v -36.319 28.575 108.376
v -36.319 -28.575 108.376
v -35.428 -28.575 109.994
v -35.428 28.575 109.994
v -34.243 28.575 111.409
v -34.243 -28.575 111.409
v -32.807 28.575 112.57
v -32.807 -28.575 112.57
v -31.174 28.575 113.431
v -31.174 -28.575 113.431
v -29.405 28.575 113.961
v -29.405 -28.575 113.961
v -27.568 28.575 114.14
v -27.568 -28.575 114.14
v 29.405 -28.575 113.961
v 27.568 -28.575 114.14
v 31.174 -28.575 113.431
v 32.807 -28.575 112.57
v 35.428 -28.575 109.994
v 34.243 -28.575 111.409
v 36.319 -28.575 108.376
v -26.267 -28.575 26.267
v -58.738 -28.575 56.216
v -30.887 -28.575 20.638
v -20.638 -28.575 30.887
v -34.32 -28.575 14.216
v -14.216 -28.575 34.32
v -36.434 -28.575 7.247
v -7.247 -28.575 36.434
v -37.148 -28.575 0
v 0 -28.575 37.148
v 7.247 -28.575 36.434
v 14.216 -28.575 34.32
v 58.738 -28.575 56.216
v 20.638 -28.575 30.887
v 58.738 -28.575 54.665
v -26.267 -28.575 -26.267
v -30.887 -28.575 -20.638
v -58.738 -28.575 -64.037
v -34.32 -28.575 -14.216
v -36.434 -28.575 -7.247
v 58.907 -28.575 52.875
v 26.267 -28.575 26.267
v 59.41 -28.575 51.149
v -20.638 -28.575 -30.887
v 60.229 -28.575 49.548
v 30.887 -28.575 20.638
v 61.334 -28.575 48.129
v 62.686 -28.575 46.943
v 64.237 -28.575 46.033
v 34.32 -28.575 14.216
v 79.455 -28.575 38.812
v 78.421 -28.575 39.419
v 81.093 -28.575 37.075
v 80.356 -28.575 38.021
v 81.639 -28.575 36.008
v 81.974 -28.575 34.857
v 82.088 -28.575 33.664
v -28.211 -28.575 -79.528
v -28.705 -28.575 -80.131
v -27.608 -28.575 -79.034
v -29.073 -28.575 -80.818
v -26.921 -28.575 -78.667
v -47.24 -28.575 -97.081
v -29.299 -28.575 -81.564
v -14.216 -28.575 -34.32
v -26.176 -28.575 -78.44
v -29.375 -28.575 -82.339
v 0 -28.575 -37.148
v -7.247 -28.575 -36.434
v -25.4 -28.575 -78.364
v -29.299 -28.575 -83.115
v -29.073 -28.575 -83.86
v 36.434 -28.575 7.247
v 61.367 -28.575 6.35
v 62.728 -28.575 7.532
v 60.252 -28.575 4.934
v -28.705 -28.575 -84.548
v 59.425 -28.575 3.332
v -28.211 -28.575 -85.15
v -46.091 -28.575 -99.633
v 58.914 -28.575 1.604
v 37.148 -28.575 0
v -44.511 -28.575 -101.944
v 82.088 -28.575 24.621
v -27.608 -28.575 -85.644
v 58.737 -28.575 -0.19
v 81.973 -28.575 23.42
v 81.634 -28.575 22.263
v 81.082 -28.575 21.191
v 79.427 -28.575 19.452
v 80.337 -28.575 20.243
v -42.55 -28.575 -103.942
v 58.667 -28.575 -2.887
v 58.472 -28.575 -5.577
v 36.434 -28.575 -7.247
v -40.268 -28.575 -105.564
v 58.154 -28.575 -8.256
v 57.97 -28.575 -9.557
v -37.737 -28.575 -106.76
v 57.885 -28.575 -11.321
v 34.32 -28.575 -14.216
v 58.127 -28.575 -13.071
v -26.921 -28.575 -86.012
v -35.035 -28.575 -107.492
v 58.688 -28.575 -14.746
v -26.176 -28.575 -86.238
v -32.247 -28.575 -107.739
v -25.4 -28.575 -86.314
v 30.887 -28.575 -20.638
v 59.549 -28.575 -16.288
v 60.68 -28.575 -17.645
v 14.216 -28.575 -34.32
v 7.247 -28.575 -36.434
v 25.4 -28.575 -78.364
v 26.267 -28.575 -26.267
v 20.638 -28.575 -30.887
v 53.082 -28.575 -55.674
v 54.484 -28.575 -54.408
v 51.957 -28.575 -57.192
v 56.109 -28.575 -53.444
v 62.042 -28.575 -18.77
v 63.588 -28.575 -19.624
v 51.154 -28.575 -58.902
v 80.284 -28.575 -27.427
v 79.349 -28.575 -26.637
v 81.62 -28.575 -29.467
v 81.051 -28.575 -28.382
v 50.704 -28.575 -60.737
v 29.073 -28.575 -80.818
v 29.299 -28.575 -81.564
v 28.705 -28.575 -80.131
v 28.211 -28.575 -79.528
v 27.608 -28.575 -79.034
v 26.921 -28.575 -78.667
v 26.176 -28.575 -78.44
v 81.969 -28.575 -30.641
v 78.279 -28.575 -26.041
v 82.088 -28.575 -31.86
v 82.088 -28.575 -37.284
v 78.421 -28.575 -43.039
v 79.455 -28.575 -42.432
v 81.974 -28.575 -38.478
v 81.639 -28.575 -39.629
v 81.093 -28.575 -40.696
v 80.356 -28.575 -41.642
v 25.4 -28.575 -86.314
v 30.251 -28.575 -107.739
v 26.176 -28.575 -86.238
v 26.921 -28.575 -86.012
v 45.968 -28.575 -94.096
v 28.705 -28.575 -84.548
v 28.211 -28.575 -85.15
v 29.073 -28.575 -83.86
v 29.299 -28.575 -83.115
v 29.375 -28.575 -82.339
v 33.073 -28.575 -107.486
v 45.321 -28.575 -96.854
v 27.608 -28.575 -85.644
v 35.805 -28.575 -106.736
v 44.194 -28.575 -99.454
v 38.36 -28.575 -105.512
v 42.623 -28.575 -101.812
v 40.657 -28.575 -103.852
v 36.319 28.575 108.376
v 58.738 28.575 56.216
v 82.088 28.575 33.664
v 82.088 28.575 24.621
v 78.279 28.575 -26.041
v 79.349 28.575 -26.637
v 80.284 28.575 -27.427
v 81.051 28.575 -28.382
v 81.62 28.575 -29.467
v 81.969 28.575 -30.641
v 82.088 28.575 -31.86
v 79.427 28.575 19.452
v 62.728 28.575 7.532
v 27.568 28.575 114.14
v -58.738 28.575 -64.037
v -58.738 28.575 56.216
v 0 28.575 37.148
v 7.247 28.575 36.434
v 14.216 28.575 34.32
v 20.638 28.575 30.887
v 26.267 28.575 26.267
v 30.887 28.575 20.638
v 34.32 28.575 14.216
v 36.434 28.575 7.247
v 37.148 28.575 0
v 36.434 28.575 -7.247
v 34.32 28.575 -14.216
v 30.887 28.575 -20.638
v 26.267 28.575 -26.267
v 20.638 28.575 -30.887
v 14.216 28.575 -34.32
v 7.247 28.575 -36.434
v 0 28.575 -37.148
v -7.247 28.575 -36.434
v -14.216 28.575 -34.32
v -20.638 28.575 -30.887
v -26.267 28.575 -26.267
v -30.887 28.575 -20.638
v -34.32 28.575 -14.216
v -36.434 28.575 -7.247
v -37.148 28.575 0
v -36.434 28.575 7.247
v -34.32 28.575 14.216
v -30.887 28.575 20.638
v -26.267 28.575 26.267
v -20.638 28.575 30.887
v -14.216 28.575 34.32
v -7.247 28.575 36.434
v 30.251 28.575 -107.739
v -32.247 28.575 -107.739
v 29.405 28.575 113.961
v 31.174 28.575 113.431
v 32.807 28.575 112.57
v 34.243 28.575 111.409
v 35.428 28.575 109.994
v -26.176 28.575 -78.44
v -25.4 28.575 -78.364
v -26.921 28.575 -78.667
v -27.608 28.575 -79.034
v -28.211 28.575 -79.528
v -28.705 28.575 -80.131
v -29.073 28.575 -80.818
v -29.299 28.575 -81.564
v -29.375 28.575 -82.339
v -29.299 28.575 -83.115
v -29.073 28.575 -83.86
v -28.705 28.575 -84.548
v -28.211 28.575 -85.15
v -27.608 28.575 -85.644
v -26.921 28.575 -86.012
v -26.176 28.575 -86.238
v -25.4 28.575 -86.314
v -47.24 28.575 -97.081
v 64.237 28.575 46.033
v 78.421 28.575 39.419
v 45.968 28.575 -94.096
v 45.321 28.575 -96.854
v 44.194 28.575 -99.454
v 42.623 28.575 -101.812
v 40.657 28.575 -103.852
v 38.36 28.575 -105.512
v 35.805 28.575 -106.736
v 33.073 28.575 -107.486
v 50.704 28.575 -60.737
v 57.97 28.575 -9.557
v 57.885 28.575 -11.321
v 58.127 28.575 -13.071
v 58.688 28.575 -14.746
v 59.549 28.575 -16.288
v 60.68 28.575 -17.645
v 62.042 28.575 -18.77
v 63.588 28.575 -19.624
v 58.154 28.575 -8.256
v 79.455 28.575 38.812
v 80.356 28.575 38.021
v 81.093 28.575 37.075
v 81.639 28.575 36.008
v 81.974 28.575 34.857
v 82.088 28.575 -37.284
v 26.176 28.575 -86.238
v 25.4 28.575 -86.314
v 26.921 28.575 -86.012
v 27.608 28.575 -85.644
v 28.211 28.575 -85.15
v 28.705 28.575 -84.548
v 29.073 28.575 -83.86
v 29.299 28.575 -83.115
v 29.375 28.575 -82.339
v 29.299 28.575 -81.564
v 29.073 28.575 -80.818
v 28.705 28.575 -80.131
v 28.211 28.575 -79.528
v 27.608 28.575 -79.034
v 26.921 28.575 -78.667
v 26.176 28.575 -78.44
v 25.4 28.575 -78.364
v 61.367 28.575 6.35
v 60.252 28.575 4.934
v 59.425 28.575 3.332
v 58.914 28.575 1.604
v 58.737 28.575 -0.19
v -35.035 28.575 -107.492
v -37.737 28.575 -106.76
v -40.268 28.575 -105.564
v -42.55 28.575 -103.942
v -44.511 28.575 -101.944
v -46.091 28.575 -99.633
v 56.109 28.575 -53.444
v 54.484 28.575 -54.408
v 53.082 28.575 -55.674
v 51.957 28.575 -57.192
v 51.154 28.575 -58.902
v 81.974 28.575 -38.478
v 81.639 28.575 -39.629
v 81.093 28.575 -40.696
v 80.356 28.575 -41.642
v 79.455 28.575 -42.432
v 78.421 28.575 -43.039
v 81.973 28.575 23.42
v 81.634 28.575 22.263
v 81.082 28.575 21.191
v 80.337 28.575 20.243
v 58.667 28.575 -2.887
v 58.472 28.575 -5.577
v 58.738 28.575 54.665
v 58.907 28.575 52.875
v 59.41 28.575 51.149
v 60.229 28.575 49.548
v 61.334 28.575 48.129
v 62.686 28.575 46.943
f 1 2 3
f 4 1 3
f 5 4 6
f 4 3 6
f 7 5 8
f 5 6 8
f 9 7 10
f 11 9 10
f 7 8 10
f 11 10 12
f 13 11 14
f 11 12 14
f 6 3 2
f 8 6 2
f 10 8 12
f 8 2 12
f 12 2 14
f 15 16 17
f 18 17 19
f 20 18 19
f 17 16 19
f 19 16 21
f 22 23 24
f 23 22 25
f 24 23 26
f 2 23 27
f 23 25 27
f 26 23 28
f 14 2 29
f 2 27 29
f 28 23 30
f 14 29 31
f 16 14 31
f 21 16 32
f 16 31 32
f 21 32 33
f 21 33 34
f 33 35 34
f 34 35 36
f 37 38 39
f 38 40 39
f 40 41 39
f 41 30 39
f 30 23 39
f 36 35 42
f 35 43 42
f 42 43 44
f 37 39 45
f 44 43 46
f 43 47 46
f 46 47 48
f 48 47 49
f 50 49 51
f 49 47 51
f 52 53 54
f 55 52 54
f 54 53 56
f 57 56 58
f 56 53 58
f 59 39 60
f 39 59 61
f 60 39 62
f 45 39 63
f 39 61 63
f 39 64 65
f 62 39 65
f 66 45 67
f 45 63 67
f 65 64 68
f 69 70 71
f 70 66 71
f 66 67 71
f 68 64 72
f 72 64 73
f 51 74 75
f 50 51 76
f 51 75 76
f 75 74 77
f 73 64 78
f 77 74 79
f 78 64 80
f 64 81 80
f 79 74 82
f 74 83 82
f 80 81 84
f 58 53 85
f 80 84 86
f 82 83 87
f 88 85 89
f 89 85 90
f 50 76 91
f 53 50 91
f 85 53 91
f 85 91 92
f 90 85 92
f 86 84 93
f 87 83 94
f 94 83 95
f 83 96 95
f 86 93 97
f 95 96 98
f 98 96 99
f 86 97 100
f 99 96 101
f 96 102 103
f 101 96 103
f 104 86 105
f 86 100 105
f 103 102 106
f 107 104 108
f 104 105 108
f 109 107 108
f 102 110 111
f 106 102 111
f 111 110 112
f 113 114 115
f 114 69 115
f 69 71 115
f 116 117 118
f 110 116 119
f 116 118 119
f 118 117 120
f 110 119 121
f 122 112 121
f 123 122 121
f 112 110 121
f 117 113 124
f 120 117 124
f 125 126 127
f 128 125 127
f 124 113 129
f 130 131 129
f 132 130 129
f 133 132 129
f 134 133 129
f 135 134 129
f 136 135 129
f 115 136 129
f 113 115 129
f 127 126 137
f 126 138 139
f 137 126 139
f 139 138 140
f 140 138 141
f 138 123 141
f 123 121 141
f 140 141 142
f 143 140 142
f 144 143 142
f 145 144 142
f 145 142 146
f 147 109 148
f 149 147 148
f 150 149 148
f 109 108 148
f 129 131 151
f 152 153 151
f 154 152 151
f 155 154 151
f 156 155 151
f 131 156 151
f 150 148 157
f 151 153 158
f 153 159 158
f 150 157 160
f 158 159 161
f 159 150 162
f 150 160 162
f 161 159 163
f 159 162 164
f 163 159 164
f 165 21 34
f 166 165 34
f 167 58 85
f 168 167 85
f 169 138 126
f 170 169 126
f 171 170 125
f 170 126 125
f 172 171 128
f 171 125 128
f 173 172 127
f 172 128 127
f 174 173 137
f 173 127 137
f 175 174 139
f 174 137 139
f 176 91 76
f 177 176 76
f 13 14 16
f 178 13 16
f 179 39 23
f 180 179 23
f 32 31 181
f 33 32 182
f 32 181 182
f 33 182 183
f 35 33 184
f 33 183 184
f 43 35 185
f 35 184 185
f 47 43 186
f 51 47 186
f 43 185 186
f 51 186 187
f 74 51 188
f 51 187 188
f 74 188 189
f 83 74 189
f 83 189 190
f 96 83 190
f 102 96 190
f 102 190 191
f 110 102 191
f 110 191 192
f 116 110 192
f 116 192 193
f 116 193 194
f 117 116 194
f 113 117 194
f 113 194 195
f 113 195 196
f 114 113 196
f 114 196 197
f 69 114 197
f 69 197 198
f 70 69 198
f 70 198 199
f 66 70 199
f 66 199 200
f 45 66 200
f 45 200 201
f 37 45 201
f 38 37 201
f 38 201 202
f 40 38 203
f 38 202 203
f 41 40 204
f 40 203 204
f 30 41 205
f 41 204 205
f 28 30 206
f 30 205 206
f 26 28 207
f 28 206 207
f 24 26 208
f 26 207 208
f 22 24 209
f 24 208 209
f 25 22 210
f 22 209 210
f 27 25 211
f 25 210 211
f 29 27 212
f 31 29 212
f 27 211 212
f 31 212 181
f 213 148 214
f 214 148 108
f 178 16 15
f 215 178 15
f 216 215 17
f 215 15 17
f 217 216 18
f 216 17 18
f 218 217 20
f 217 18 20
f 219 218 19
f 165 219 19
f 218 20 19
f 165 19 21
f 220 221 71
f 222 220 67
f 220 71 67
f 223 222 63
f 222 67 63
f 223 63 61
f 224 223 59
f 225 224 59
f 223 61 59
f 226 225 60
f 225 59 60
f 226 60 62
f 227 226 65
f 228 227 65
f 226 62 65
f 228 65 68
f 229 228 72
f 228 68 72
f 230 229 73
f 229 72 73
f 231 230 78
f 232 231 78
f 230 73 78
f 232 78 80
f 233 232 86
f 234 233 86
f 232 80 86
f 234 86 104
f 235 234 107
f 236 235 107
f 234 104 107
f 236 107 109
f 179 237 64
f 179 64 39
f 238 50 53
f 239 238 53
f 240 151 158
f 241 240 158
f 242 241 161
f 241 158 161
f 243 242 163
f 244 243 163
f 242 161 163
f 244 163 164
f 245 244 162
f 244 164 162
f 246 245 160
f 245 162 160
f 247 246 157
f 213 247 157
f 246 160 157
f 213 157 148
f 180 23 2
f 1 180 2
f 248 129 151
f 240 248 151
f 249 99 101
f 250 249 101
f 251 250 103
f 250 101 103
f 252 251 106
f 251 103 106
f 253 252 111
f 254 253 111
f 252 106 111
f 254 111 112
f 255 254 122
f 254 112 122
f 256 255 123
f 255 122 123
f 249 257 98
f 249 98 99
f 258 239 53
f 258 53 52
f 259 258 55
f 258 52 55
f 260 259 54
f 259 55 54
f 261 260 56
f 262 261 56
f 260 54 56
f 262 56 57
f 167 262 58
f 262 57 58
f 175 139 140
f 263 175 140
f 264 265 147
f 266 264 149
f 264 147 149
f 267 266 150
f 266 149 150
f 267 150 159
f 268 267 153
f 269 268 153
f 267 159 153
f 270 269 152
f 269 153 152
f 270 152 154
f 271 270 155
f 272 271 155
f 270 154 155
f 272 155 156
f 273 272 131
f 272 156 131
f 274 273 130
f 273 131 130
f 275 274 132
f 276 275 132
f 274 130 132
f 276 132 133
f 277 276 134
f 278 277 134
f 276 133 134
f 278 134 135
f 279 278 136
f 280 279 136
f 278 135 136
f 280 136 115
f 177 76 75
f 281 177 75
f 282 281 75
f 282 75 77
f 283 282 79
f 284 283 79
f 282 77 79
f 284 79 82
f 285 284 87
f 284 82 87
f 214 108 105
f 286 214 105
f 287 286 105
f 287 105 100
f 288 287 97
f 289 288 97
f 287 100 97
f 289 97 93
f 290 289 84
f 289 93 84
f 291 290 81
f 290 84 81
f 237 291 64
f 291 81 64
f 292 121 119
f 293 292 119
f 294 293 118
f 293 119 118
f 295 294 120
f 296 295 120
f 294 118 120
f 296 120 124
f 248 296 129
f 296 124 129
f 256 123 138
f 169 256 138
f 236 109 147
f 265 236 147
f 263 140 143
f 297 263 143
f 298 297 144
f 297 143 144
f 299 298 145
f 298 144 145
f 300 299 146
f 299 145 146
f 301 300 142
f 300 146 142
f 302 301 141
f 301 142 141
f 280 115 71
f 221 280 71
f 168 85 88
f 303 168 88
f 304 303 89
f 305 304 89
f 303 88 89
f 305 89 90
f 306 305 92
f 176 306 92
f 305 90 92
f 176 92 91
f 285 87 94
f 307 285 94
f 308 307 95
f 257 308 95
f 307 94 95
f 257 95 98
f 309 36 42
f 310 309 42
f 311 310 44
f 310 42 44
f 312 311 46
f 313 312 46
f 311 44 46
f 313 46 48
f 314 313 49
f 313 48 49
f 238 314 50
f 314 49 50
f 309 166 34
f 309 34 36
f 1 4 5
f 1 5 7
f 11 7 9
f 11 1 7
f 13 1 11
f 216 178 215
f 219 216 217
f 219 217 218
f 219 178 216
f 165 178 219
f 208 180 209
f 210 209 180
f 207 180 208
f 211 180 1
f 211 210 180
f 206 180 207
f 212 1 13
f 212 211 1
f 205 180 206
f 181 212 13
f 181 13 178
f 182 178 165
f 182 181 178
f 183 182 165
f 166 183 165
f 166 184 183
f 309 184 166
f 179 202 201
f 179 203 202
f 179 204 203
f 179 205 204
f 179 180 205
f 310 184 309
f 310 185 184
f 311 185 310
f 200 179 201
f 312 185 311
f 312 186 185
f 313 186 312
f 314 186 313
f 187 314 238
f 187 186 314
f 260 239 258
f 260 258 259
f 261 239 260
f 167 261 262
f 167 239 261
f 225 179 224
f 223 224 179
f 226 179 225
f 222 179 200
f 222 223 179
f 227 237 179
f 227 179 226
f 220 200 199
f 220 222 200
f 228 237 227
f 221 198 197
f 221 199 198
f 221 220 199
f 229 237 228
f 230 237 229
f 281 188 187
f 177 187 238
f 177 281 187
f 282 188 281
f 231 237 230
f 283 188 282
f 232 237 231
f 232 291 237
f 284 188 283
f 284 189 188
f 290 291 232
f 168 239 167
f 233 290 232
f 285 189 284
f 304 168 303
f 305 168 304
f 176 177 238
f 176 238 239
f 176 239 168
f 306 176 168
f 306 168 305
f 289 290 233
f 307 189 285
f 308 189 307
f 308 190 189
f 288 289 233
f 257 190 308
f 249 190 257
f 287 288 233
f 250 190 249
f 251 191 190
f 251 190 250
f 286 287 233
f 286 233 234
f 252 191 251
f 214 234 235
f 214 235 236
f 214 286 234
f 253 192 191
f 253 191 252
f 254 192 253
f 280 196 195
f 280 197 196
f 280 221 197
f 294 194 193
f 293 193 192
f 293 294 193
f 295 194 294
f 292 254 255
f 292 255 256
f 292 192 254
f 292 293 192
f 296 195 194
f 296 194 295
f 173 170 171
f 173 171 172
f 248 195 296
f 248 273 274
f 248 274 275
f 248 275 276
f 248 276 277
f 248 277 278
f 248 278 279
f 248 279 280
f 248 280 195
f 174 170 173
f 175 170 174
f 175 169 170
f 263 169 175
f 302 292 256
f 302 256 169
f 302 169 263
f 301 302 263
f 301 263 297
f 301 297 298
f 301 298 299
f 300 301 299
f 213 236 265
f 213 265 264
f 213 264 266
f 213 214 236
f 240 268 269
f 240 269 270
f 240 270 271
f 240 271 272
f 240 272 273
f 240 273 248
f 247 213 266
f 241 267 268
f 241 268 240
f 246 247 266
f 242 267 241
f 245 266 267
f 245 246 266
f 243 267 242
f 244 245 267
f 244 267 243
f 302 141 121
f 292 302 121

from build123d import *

# Parameters (mm, degrees)
BOSS_EXTRUDE1_DEPTH      = 28.575
BOSS_EXTRUDE1_DEPTH_BACK = 28.575
SKETCH2_R                = 37.1475
CUT_EXTRUDE1_DEPTH       = 152.764361406
CUT_EXTRUDE2_DEPTH       = 152.764361406


with BuildPart() as part:
    # Sketch1 → Boss-Extrude1 (new, two sides: drawn at the far end of the back side and taken through both)
    with BuildSketch(Plane(origin=(0, 0, 0), x_dir=(1, 0, 0), z_dir=(0, 1, 0)).offset(-BOSS_EXTRUDE1_DEPTH_BACK)):
        with BuildLine():
            Line((-58.7375, -56.215922718), (-36.318524201, -108.376210733))
            ThreePointArc((-36.318524201, -108.376210733), (-32.806864724, -112.569580799), (-27.567594628, -114.13998))
            Line((-27.567594628, -114.13998), (27.567594628, -114.13998))
            ThreePointArc((27.567594628, -114.13998), (32.806864724, -112.569580799), (36.318524201, -108.376210733))
            Line((36.318524201, -108.376210733), (58.7375, -56.215922718))
            Line((58.7375, -56.215922718), (58.7375, -54.665315944))
            ThreePointArc((58.7375, -54.665315944), (60.229196479, -49.547537174), (64.237061057, -46.032734272))
            Line((64.237061057, -46.032734272), (78.421163742, -39.418578566))
            ThreePointArc((78.421163742, -39.418578566), (81.09307346, -37.075376632), (82.087537779, -33.663524119))
            Line((82.087537779, -33.663524119), (82.087537779, -24.620694942))
            ThreePointArc((82.087537779, -24.620694942), (81.383346428, -21.714263332), (79.426956769, -19.452456605))
            Line((79.426956769, -19.452456605), (62.728014827, -7.531684093))
            ThreePointArc((62.728014827, -7.531684093), (59.800488167, -4.152656806), (58.737193082, 0.189881775))
            ThreePointArc((58.737193082, 0.189881775), (58.584774766, 4.232974359), (58.154386408, 8.255982544))
            Line((58.154386408, 8.255982544), (57.969746696, 9.5565678))
            ThreePointArc((57.969746696, 9.5565678), (59.08262132, 15.536896429), (63.58784972, 19.624161713))
            Line((63.58784972, 19.624161713), (78.279096456, 26.040632326))
            ThreePointArc((78.279096456, 26.040632326), (81.050794671, 28.382496216), (82.087537779, 31.859822947))
            Line((82.087537779, 31.859822947), (82.087537779, 37.284206824))
            ThreePointArc((82.087537779, 37.284206824), (81.09307346, 40.696059337), (78.421163742, 43.039261272))
            Line((78.421163742, 43.039261272), (56.108767451, 53.443702534))
            ThreePointArc((56.108767451, 53.443702534), (52.481431722, 56.405246839), (50.703765355, 60.737476226))
            Line((50.703765355, 60.737476226), (45.968035191, 94.095526633))
            ThreePointArc((45.968035191, 94.095526633), (40.657193823, 103.852471221), (30.25063346, 107.73918))
            Line((30.25063346, 107.73918), (-32.2469722, 107.73918))
            ThreePointArc((-32.2469722, 107.73918), (-41.44482588, 104.803079207), (-47.240370837, 97.080847739))
            Line((-47.240370837, 97.080847739), (-58.7375, 64.036565575))
            Line((-58.7375, 64.036565575), (-58.7375, -56.215922718))
        make_face()
    extrude(amount=BOSS_EXTRUDE1_DEPTH + BOSS_EXTRUDE1_DEPTH_BACK)

    # Sketch2 → Cut-Extrude1 (cut, through all)
    with BuildSketch(Plane(origin=(0, 28.575, 0), x_dir=(1, 0, 0), z_dir=(0, 1, 0))):
        Circle(SKETCH2_R)
    extrude(amount=-CUT_EXTRUDE1_DEPTH, mode=Mode.SUBTRACT)

    # Sketch5 → Cut-Extrude2 (cut, through all)
    with BuildSketch(Plane.XZ.offset(28.575)):
        with BuildLine():
            Line((-25.4, -86.31428), (25.4, -86.31428))
            ThreePointArc((25.4, -86.31428), (29.3751, -82.33918), (25.4, -78.36408))
            Line((25.4, -78.36408), (-25.4, -78.36408))
            ThreePointArc((-25.4, -78.36408), (-29.3751, -82.33918), (-25.4, -86.31428))
        make_face()
    extrude(amount=-CUT_EXTRUDE2_DEPTH, mode=Mode.SUBTRACT)


solid = part.part
